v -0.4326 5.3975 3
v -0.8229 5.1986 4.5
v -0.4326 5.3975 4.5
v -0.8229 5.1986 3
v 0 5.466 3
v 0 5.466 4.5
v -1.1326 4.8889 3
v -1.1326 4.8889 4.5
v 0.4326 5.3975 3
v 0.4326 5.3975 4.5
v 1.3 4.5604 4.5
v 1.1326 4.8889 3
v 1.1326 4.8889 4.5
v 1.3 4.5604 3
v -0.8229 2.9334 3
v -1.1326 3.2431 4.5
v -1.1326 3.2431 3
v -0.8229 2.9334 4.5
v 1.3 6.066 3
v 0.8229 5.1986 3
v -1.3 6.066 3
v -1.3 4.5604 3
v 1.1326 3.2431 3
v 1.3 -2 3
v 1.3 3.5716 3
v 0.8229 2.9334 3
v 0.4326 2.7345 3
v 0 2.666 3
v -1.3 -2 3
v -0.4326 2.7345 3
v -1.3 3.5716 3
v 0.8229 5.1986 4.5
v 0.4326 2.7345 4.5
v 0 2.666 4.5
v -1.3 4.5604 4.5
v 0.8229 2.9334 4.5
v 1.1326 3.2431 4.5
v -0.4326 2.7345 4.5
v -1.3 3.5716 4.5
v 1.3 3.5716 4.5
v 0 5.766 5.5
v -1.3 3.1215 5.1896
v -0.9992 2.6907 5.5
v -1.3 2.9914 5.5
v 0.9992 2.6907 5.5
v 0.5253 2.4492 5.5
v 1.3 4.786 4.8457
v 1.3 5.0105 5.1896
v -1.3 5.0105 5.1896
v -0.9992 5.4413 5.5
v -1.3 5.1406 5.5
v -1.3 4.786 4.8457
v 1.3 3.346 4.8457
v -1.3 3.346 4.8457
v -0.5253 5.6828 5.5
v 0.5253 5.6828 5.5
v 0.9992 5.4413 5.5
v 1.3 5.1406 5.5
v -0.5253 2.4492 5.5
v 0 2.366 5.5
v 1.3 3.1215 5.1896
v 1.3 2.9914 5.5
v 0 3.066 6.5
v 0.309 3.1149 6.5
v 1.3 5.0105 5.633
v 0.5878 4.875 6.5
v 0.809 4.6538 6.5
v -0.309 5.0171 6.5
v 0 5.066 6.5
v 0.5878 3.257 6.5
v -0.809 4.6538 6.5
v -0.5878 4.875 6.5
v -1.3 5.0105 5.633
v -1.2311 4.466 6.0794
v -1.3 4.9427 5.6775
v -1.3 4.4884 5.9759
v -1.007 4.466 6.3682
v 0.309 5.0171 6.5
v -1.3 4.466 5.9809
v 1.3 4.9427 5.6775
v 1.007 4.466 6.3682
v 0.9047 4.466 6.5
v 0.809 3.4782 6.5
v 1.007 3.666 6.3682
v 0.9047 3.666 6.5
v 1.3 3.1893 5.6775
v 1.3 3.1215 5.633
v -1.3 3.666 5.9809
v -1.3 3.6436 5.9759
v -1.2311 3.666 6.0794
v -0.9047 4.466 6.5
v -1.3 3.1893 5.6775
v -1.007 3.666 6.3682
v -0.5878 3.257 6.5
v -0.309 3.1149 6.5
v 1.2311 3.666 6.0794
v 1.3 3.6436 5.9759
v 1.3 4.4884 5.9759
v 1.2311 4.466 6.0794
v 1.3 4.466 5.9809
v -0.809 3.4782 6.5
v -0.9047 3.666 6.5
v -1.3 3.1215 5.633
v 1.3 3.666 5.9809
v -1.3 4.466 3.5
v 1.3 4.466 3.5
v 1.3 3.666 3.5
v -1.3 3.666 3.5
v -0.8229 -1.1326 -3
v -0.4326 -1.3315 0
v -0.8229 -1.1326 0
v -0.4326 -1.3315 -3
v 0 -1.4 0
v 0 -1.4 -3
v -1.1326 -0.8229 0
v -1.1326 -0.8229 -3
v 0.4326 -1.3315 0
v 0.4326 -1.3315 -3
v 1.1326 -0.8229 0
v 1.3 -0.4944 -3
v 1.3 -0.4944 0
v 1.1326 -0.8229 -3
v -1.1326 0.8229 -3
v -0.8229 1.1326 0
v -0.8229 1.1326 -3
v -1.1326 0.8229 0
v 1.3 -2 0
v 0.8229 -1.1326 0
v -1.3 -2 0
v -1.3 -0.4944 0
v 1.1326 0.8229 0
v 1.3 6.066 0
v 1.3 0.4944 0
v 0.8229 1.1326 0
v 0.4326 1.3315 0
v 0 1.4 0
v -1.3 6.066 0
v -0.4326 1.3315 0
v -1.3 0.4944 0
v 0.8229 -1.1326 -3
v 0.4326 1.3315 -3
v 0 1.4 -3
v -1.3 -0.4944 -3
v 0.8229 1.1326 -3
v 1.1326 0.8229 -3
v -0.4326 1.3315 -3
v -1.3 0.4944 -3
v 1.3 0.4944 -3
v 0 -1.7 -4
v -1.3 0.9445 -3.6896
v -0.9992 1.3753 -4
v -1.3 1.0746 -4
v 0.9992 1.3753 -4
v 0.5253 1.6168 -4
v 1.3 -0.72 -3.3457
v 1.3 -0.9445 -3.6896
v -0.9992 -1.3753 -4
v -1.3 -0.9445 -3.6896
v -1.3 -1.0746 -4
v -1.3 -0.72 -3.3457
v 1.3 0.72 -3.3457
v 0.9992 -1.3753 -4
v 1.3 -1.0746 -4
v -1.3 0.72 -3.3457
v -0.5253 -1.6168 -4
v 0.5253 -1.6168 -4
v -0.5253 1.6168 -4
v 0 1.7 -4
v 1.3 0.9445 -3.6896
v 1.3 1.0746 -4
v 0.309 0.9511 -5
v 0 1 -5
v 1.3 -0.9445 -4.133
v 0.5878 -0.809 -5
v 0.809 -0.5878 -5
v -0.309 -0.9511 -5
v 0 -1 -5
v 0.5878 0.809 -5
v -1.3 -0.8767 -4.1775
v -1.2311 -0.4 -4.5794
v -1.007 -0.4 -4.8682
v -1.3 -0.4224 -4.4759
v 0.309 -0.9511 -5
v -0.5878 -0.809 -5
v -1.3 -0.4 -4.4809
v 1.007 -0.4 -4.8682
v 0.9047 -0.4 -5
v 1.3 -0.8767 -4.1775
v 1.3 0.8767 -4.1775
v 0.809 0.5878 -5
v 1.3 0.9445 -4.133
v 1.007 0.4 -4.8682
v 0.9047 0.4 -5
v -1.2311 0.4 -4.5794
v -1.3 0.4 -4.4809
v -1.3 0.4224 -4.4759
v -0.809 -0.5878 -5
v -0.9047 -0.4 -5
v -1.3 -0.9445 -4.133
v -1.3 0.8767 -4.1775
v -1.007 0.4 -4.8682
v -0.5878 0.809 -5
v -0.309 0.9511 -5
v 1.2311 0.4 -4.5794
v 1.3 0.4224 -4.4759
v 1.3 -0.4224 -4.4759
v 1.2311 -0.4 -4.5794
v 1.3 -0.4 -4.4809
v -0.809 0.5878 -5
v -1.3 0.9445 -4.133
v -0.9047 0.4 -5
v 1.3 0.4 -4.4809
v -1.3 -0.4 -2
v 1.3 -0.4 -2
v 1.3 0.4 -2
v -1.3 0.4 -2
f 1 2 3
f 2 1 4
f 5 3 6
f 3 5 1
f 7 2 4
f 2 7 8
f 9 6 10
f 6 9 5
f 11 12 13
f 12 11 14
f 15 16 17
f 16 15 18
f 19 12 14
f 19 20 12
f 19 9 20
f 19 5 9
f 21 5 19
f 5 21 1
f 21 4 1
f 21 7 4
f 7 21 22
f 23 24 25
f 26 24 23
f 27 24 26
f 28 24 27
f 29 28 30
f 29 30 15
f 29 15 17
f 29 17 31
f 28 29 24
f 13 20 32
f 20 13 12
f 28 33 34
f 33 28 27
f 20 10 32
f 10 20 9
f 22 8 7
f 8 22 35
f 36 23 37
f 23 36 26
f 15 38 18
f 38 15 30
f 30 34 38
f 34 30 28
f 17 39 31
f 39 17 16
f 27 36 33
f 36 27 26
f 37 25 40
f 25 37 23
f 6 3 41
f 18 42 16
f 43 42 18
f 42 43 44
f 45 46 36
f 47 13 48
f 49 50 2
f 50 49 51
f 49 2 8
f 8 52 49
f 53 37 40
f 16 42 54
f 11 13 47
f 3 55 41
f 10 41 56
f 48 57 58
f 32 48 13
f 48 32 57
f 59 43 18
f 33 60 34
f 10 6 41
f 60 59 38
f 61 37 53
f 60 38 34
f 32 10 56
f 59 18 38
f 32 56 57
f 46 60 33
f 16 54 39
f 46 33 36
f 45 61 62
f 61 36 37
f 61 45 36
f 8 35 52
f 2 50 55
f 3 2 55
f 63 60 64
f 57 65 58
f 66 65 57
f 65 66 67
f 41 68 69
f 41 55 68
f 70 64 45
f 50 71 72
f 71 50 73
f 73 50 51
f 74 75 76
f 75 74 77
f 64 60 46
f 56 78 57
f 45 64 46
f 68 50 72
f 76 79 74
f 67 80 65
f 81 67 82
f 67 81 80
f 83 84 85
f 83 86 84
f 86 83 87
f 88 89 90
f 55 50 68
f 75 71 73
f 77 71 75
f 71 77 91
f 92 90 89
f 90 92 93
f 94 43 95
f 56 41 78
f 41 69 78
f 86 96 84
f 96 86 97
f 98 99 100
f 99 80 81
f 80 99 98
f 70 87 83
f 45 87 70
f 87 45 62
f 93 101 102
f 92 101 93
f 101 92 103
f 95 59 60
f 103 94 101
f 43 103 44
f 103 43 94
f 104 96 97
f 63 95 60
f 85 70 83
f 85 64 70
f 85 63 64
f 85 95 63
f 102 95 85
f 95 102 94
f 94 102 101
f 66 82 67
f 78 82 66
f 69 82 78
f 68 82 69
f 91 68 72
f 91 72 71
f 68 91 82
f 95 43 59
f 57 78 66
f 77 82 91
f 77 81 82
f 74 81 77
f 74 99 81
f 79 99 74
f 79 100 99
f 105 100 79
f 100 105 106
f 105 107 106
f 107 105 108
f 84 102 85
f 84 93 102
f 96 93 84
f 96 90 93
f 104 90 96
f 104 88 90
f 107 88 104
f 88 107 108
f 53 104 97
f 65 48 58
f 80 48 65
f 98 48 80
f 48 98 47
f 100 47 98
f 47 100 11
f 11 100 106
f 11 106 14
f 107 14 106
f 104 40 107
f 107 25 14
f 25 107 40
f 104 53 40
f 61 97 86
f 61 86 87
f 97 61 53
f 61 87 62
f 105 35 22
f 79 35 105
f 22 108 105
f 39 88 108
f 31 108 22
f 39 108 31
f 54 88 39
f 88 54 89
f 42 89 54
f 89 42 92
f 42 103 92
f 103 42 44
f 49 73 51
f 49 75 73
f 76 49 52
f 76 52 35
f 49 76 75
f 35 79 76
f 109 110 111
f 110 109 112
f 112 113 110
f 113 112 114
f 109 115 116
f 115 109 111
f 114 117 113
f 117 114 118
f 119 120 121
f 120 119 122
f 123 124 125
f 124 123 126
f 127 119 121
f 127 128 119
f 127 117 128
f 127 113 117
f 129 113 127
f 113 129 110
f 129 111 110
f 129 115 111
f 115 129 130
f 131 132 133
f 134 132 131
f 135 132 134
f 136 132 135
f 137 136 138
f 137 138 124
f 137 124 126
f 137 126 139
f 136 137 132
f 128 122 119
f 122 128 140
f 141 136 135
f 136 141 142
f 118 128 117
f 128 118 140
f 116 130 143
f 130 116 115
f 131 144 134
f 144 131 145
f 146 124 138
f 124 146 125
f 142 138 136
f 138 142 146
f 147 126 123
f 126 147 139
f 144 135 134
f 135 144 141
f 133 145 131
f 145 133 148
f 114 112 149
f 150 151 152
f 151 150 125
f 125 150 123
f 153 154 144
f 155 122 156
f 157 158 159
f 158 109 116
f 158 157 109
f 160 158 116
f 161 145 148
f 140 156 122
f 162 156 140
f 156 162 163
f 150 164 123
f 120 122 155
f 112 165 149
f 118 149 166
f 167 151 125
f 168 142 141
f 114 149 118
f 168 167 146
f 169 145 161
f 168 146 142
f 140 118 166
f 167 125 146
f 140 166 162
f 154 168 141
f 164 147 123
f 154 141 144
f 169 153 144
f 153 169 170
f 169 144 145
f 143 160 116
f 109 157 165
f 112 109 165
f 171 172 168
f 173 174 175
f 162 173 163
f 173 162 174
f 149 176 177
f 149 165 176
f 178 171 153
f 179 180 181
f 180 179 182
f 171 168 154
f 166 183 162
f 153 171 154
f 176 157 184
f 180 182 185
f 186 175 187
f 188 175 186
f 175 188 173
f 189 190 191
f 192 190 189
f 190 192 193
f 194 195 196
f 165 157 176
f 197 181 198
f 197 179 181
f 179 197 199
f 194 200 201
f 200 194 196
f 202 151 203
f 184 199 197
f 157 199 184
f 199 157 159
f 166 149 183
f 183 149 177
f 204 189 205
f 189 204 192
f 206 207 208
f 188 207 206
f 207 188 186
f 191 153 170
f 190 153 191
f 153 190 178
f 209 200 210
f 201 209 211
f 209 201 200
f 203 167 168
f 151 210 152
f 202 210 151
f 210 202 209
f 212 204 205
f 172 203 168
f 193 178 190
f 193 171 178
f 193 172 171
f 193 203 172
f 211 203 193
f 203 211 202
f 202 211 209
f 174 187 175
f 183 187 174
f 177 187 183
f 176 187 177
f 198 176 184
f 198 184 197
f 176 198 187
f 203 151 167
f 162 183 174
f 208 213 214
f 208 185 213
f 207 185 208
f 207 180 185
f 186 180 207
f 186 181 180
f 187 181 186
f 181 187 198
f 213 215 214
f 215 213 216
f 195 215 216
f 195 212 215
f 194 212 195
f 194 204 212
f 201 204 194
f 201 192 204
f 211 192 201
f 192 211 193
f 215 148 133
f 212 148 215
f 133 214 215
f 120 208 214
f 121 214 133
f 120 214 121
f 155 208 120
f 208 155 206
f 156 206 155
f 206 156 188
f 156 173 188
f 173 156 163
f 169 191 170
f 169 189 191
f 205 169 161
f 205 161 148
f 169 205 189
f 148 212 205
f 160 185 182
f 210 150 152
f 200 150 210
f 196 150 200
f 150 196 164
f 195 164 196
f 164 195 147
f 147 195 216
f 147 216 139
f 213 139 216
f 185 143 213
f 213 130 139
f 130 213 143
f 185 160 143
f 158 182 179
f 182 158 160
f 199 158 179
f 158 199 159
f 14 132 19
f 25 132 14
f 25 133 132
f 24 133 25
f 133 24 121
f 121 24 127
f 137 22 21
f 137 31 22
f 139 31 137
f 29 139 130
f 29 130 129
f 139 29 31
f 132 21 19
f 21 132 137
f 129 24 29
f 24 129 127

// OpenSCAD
module clip(h){
    difference() {
        rotate([0, 0, 90]) difference() {
            union() {
                cylinder(h, 1.5-0.1, 1.5-0.1, $fn=20);
                translate([0, 0, h]) cylinder(1, 1.5-0.1, 1.5+0.2, $fn=20);
                translate([0, 0, h+1]) cylinder(1, 1.5+0.2, 1, $fn=20);
            }
            translate([-0.4, -2, h-1]) cube([0.8, 4, 8]);
        }
        translate([1.3, -3, -1]) cube([2, 6, 10]);
        translate([-3.3, -3, -1]) cube([2, 6, 10]);
    }
}

/*
union() {
    translate([0, 0, 3]) clip(1.5);
    translate([-1.3, -2, 0]) cube([3-0.4,4,3]);
    rotate([180, 0, 0]) clip(3);
}
*/

union() {
    translate([0, 4.066, 3]) clip(1.5);
    translate([-1.3, -2, 0]) cube([3-0.4,4+4.066,3]);
    rotate([180, 0, 0]) clip(3);
}
